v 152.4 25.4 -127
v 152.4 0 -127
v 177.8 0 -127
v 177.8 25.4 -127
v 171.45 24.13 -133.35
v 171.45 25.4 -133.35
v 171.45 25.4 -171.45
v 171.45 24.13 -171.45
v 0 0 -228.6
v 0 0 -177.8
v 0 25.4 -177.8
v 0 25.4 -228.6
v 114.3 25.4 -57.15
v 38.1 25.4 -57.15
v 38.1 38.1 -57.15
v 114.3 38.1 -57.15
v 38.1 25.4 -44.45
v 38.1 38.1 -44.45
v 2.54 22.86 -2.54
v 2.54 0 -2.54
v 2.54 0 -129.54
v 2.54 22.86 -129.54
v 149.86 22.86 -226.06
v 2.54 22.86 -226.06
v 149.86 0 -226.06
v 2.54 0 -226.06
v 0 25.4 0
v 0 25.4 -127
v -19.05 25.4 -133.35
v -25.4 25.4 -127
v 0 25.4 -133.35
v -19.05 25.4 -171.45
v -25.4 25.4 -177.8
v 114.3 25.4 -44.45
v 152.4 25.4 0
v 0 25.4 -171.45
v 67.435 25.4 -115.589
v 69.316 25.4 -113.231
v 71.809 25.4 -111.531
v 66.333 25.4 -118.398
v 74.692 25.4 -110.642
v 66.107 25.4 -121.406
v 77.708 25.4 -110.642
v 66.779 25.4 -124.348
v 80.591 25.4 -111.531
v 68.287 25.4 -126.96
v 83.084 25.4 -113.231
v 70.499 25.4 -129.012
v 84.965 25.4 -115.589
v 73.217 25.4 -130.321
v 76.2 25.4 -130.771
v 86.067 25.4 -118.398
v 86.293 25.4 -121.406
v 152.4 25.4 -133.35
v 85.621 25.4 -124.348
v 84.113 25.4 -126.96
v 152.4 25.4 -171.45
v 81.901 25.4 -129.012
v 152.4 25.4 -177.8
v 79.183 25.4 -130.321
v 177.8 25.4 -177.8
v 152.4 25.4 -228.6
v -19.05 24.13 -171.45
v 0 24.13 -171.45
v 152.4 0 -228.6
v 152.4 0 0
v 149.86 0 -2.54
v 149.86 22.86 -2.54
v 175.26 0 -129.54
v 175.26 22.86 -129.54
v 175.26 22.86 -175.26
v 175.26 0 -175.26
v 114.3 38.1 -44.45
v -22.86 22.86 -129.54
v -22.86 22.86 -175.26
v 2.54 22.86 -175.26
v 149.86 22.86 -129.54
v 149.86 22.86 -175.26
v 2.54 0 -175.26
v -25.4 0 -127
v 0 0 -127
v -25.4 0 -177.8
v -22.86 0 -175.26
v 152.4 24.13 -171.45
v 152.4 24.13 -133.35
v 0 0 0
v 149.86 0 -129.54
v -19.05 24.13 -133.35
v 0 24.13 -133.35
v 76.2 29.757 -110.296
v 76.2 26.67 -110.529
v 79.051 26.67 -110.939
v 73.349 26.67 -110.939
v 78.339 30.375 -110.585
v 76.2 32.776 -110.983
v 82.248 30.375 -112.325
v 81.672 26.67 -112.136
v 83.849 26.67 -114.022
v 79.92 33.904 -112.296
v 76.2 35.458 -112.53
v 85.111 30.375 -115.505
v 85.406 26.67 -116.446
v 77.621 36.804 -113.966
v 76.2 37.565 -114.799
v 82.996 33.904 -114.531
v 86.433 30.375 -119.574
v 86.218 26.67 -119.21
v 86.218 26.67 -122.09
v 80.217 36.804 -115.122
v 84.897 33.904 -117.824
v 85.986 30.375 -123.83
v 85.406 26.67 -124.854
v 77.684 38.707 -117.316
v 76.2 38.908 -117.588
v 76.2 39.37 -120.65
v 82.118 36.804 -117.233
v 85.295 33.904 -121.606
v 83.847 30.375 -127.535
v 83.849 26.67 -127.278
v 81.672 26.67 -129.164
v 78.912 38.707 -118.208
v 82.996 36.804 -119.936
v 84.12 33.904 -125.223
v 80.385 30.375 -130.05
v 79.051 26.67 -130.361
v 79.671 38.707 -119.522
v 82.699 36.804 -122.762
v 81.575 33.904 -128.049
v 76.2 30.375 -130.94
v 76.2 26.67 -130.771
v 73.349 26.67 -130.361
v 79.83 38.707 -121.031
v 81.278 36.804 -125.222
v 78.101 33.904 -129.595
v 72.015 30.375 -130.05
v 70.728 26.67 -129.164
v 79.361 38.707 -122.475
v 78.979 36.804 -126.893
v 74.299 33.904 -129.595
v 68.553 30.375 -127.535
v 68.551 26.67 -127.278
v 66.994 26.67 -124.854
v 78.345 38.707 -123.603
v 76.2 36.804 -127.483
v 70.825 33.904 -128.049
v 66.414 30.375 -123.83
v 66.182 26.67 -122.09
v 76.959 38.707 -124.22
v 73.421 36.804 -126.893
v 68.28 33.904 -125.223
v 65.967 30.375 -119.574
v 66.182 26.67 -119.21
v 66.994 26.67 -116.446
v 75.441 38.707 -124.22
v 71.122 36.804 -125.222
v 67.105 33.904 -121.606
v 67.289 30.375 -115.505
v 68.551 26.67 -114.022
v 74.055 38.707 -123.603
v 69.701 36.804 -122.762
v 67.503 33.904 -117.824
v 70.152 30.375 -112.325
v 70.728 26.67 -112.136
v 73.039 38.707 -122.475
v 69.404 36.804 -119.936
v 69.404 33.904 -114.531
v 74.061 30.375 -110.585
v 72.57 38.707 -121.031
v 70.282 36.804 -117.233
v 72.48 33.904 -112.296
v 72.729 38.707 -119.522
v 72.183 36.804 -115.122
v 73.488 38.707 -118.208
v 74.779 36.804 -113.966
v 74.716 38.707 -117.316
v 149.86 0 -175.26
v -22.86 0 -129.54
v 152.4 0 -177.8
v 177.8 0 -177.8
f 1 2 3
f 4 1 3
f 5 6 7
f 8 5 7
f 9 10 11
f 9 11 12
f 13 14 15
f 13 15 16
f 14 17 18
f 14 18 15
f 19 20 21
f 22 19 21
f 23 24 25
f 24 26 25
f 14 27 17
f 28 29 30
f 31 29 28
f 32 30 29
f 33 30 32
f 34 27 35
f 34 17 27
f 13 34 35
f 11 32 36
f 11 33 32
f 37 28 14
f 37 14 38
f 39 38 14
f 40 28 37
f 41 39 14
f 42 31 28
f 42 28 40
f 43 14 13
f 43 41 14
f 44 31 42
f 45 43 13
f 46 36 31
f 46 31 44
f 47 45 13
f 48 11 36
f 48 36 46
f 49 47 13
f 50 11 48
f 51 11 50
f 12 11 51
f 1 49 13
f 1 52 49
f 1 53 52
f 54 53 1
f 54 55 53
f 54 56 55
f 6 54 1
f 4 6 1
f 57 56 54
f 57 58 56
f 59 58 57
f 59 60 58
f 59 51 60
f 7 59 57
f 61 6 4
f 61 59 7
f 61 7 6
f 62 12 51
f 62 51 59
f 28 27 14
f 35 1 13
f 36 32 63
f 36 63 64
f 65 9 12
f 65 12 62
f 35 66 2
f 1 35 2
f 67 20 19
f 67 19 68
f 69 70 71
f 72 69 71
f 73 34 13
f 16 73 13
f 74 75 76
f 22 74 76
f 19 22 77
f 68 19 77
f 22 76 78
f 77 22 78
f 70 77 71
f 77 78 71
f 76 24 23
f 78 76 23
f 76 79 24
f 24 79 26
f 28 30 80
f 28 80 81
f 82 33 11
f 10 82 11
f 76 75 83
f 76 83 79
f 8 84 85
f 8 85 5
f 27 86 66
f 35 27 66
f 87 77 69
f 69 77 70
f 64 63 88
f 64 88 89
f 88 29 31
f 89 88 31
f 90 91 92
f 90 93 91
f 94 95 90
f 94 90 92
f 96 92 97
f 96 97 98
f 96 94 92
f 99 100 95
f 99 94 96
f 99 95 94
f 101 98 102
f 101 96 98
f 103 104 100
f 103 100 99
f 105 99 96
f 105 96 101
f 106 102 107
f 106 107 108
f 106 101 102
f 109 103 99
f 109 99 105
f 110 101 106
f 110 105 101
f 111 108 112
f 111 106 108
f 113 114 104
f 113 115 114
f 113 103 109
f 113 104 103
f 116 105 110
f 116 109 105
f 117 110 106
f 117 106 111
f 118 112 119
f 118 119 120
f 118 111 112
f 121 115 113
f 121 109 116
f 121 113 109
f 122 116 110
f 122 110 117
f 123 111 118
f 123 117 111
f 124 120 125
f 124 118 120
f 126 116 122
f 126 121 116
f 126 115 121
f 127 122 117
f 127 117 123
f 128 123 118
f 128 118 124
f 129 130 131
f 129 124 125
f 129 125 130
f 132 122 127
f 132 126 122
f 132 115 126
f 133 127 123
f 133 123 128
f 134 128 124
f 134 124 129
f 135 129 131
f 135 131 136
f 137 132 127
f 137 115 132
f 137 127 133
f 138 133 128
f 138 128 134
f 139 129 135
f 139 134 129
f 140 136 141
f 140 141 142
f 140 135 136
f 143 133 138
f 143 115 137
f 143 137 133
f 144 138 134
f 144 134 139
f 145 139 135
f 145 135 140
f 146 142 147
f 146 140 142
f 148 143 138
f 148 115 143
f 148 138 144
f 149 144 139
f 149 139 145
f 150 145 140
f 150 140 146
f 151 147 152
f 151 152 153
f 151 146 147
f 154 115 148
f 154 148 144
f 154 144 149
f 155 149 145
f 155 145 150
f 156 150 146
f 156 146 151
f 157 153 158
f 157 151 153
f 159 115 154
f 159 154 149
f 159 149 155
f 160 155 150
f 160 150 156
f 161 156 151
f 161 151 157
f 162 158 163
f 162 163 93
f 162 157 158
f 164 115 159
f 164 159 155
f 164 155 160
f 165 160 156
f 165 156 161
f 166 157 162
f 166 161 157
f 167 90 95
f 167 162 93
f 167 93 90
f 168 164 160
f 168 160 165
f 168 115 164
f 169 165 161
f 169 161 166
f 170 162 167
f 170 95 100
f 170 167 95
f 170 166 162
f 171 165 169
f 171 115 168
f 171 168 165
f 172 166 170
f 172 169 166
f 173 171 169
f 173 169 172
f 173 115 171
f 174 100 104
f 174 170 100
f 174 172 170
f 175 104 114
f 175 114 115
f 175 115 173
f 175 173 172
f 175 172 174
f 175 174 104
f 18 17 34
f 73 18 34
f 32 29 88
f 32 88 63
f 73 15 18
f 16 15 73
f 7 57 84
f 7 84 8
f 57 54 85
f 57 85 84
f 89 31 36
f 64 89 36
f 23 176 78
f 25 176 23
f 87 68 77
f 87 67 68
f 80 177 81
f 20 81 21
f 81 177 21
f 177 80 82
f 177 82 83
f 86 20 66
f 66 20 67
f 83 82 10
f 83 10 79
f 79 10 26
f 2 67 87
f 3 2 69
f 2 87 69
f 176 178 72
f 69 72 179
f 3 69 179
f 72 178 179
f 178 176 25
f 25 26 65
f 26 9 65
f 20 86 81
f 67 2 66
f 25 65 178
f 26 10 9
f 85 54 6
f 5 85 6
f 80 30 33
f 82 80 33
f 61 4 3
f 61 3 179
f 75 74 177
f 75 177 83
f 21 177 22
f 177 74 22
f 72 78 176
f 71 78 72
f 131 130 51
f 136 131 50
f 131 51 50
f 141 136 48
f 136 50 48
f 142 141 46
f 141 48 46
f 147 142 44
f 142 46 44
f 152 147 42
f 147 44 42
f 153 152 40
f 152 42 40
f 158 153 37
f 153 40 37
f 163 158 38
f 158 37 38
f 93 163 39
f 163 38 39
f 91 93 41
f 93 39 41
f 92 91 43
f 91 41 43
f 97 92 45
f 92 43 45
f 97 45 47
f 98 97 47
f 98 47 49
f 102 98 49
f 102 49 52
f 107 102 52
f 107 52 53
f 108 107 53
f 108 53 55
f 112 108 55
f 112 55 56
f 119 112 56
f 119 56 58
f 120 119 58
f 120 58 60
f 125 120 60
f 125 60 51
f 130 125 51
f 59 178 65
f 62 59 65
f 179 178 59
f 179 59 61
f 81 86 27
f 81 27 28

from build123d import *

# Parameters (mm, degrees)
SKETCH1_W           = 152.4
SKETCH1_H           = 228.6
BOSS_EXTRUDE1_DEPTH = 25.4
SKETCH5_W           = 25.4
SKETCH5_H           = 50.8
BOSS_EXTRUDE5_DEPTH = 25.4
SHELL1_T            = -2.54
SKETCH4_W           = 76.2
SKETCH4_H           = 12.7
BOSS_EXTRUDE4_DEPTH = 12.7
SKETCH3_R           = 10.121060994
BOSS_EXTRUDE3_DEPTH = 1.27
DOME1_FACE_RADIUS   = 10.121060994
DOME1_HEIGHT        = 12.7
SKETCH7_W           = 19.05
SKETCH7_H           = 38.1
CUT_EXTRUDE1_DEPTH  = 1.27


with BuildPart() as part:
    # Sketch1 → Boss-Extrude1 (new body)
    with BuildSketch(Plane(origin=(0, 0, 0), x_dir=(1, 0, 0), z_dir=(0, 1, 0))):
        with Locations((76.2, 114.3)):
            Rectangle(SKETCH1_W, SKETCH1_H)
    extrude(amount=BOSS_EXTRUDE1_DEPTH)

    # Sketch5 → Boss-Extrude5 (add)
    with BuildSketch(Plane(origin=(0, 25.4, 0), x_dir=(1, 0, 0), z_dir=(0, 1, 0))):
        with Locations((165.1, 152.4)):
            Rectangle(SKETCH5_W, SKETCH5_H)
        with Locations((-12.7, 152.4)):
            Rectangle(SKETCH5_W, SKETCH5_H)
    extrude(amount=-BOSS_EXTRUDE5_DEPTH)

    # Shell1
    shell1_openings = [part.faces().sort_by_distance(p)[0] for p in [
        (76.2, 0, -116.927586207),
    ]]
    offset(amount=SHELL1_T, openings=shell1_openings, kind=Kind.INTERSECTION)

    # Sketch4 → Boss-Extrude4 (add)
    with BuildSketch(Plane(origin=(0, 25.4, 0), x_dir=(1, 0, 0), z_dir=(0, 1, 0))):
        with Locations((76.2, 50.8)):
            Rectangle(SKETCH4_W, SKETCH4_H)
    extrude(amount=BOSS_EXTRUDE4_DEPTH)

    # Sketch3 → Boss-Extrude3 (add)
    with BuildSketch(Plane(origin=(0, 25.4, 0), x_dir=(1, 0, 0), z_dir=(0, 1, 0))):
        with Locations(Location((76.2, 120.65, 0), (0, 0, 90))):
            Circle(SKETCH3_R)
    extrude(amount=BOSS_EXTRUDE3_DEPTH)

    # Dome1: a dome of height H over a round flat face of radius A is a cap of a sphere of radius (A * A + H * H) / (2 * H)
    dome1_r = (DOME1_FACE_RADIUS * DOME1_FACE_RADIUS + DOME1_HEIGHT * DOME1_HEIGHT) / (2 * DOME1_HEIGHT)
    dome1_base = Plane((76.2, 26.67, -120.65), z_dir=(0, 1, 0))
    with Locations(dome1_base.offset(DOME1_HEIGHT - dome1_r)):
        dome1_ball = Sphere(dome1_r, mode=Mode.PRIVATE)
    add(split(dome1_ball, bisect_by=dome1_base, keep=Keep.TOP, mode=Mode.PRIVATE))

    # Sketch7 → Cut-Extrude1 (cut)
    with BuildSketch(Plane(origin=(0, 25.4, 0), x_dir=(1, 0, 0), z_dir=(0, 1, 0))):
        with Locations((-9.525, 152.4)):
            Rectangle(SKETCH7_W, SKETCH7_H)
        with Locations((161.925, 152.4)):
            Rectangle(SKETCH7_W, SKETCH7_H)
    extrude(amount=-CUT_EXTRUDE1_DEPTH, mode=Mode.SUBTRACT)


solid = part.part
